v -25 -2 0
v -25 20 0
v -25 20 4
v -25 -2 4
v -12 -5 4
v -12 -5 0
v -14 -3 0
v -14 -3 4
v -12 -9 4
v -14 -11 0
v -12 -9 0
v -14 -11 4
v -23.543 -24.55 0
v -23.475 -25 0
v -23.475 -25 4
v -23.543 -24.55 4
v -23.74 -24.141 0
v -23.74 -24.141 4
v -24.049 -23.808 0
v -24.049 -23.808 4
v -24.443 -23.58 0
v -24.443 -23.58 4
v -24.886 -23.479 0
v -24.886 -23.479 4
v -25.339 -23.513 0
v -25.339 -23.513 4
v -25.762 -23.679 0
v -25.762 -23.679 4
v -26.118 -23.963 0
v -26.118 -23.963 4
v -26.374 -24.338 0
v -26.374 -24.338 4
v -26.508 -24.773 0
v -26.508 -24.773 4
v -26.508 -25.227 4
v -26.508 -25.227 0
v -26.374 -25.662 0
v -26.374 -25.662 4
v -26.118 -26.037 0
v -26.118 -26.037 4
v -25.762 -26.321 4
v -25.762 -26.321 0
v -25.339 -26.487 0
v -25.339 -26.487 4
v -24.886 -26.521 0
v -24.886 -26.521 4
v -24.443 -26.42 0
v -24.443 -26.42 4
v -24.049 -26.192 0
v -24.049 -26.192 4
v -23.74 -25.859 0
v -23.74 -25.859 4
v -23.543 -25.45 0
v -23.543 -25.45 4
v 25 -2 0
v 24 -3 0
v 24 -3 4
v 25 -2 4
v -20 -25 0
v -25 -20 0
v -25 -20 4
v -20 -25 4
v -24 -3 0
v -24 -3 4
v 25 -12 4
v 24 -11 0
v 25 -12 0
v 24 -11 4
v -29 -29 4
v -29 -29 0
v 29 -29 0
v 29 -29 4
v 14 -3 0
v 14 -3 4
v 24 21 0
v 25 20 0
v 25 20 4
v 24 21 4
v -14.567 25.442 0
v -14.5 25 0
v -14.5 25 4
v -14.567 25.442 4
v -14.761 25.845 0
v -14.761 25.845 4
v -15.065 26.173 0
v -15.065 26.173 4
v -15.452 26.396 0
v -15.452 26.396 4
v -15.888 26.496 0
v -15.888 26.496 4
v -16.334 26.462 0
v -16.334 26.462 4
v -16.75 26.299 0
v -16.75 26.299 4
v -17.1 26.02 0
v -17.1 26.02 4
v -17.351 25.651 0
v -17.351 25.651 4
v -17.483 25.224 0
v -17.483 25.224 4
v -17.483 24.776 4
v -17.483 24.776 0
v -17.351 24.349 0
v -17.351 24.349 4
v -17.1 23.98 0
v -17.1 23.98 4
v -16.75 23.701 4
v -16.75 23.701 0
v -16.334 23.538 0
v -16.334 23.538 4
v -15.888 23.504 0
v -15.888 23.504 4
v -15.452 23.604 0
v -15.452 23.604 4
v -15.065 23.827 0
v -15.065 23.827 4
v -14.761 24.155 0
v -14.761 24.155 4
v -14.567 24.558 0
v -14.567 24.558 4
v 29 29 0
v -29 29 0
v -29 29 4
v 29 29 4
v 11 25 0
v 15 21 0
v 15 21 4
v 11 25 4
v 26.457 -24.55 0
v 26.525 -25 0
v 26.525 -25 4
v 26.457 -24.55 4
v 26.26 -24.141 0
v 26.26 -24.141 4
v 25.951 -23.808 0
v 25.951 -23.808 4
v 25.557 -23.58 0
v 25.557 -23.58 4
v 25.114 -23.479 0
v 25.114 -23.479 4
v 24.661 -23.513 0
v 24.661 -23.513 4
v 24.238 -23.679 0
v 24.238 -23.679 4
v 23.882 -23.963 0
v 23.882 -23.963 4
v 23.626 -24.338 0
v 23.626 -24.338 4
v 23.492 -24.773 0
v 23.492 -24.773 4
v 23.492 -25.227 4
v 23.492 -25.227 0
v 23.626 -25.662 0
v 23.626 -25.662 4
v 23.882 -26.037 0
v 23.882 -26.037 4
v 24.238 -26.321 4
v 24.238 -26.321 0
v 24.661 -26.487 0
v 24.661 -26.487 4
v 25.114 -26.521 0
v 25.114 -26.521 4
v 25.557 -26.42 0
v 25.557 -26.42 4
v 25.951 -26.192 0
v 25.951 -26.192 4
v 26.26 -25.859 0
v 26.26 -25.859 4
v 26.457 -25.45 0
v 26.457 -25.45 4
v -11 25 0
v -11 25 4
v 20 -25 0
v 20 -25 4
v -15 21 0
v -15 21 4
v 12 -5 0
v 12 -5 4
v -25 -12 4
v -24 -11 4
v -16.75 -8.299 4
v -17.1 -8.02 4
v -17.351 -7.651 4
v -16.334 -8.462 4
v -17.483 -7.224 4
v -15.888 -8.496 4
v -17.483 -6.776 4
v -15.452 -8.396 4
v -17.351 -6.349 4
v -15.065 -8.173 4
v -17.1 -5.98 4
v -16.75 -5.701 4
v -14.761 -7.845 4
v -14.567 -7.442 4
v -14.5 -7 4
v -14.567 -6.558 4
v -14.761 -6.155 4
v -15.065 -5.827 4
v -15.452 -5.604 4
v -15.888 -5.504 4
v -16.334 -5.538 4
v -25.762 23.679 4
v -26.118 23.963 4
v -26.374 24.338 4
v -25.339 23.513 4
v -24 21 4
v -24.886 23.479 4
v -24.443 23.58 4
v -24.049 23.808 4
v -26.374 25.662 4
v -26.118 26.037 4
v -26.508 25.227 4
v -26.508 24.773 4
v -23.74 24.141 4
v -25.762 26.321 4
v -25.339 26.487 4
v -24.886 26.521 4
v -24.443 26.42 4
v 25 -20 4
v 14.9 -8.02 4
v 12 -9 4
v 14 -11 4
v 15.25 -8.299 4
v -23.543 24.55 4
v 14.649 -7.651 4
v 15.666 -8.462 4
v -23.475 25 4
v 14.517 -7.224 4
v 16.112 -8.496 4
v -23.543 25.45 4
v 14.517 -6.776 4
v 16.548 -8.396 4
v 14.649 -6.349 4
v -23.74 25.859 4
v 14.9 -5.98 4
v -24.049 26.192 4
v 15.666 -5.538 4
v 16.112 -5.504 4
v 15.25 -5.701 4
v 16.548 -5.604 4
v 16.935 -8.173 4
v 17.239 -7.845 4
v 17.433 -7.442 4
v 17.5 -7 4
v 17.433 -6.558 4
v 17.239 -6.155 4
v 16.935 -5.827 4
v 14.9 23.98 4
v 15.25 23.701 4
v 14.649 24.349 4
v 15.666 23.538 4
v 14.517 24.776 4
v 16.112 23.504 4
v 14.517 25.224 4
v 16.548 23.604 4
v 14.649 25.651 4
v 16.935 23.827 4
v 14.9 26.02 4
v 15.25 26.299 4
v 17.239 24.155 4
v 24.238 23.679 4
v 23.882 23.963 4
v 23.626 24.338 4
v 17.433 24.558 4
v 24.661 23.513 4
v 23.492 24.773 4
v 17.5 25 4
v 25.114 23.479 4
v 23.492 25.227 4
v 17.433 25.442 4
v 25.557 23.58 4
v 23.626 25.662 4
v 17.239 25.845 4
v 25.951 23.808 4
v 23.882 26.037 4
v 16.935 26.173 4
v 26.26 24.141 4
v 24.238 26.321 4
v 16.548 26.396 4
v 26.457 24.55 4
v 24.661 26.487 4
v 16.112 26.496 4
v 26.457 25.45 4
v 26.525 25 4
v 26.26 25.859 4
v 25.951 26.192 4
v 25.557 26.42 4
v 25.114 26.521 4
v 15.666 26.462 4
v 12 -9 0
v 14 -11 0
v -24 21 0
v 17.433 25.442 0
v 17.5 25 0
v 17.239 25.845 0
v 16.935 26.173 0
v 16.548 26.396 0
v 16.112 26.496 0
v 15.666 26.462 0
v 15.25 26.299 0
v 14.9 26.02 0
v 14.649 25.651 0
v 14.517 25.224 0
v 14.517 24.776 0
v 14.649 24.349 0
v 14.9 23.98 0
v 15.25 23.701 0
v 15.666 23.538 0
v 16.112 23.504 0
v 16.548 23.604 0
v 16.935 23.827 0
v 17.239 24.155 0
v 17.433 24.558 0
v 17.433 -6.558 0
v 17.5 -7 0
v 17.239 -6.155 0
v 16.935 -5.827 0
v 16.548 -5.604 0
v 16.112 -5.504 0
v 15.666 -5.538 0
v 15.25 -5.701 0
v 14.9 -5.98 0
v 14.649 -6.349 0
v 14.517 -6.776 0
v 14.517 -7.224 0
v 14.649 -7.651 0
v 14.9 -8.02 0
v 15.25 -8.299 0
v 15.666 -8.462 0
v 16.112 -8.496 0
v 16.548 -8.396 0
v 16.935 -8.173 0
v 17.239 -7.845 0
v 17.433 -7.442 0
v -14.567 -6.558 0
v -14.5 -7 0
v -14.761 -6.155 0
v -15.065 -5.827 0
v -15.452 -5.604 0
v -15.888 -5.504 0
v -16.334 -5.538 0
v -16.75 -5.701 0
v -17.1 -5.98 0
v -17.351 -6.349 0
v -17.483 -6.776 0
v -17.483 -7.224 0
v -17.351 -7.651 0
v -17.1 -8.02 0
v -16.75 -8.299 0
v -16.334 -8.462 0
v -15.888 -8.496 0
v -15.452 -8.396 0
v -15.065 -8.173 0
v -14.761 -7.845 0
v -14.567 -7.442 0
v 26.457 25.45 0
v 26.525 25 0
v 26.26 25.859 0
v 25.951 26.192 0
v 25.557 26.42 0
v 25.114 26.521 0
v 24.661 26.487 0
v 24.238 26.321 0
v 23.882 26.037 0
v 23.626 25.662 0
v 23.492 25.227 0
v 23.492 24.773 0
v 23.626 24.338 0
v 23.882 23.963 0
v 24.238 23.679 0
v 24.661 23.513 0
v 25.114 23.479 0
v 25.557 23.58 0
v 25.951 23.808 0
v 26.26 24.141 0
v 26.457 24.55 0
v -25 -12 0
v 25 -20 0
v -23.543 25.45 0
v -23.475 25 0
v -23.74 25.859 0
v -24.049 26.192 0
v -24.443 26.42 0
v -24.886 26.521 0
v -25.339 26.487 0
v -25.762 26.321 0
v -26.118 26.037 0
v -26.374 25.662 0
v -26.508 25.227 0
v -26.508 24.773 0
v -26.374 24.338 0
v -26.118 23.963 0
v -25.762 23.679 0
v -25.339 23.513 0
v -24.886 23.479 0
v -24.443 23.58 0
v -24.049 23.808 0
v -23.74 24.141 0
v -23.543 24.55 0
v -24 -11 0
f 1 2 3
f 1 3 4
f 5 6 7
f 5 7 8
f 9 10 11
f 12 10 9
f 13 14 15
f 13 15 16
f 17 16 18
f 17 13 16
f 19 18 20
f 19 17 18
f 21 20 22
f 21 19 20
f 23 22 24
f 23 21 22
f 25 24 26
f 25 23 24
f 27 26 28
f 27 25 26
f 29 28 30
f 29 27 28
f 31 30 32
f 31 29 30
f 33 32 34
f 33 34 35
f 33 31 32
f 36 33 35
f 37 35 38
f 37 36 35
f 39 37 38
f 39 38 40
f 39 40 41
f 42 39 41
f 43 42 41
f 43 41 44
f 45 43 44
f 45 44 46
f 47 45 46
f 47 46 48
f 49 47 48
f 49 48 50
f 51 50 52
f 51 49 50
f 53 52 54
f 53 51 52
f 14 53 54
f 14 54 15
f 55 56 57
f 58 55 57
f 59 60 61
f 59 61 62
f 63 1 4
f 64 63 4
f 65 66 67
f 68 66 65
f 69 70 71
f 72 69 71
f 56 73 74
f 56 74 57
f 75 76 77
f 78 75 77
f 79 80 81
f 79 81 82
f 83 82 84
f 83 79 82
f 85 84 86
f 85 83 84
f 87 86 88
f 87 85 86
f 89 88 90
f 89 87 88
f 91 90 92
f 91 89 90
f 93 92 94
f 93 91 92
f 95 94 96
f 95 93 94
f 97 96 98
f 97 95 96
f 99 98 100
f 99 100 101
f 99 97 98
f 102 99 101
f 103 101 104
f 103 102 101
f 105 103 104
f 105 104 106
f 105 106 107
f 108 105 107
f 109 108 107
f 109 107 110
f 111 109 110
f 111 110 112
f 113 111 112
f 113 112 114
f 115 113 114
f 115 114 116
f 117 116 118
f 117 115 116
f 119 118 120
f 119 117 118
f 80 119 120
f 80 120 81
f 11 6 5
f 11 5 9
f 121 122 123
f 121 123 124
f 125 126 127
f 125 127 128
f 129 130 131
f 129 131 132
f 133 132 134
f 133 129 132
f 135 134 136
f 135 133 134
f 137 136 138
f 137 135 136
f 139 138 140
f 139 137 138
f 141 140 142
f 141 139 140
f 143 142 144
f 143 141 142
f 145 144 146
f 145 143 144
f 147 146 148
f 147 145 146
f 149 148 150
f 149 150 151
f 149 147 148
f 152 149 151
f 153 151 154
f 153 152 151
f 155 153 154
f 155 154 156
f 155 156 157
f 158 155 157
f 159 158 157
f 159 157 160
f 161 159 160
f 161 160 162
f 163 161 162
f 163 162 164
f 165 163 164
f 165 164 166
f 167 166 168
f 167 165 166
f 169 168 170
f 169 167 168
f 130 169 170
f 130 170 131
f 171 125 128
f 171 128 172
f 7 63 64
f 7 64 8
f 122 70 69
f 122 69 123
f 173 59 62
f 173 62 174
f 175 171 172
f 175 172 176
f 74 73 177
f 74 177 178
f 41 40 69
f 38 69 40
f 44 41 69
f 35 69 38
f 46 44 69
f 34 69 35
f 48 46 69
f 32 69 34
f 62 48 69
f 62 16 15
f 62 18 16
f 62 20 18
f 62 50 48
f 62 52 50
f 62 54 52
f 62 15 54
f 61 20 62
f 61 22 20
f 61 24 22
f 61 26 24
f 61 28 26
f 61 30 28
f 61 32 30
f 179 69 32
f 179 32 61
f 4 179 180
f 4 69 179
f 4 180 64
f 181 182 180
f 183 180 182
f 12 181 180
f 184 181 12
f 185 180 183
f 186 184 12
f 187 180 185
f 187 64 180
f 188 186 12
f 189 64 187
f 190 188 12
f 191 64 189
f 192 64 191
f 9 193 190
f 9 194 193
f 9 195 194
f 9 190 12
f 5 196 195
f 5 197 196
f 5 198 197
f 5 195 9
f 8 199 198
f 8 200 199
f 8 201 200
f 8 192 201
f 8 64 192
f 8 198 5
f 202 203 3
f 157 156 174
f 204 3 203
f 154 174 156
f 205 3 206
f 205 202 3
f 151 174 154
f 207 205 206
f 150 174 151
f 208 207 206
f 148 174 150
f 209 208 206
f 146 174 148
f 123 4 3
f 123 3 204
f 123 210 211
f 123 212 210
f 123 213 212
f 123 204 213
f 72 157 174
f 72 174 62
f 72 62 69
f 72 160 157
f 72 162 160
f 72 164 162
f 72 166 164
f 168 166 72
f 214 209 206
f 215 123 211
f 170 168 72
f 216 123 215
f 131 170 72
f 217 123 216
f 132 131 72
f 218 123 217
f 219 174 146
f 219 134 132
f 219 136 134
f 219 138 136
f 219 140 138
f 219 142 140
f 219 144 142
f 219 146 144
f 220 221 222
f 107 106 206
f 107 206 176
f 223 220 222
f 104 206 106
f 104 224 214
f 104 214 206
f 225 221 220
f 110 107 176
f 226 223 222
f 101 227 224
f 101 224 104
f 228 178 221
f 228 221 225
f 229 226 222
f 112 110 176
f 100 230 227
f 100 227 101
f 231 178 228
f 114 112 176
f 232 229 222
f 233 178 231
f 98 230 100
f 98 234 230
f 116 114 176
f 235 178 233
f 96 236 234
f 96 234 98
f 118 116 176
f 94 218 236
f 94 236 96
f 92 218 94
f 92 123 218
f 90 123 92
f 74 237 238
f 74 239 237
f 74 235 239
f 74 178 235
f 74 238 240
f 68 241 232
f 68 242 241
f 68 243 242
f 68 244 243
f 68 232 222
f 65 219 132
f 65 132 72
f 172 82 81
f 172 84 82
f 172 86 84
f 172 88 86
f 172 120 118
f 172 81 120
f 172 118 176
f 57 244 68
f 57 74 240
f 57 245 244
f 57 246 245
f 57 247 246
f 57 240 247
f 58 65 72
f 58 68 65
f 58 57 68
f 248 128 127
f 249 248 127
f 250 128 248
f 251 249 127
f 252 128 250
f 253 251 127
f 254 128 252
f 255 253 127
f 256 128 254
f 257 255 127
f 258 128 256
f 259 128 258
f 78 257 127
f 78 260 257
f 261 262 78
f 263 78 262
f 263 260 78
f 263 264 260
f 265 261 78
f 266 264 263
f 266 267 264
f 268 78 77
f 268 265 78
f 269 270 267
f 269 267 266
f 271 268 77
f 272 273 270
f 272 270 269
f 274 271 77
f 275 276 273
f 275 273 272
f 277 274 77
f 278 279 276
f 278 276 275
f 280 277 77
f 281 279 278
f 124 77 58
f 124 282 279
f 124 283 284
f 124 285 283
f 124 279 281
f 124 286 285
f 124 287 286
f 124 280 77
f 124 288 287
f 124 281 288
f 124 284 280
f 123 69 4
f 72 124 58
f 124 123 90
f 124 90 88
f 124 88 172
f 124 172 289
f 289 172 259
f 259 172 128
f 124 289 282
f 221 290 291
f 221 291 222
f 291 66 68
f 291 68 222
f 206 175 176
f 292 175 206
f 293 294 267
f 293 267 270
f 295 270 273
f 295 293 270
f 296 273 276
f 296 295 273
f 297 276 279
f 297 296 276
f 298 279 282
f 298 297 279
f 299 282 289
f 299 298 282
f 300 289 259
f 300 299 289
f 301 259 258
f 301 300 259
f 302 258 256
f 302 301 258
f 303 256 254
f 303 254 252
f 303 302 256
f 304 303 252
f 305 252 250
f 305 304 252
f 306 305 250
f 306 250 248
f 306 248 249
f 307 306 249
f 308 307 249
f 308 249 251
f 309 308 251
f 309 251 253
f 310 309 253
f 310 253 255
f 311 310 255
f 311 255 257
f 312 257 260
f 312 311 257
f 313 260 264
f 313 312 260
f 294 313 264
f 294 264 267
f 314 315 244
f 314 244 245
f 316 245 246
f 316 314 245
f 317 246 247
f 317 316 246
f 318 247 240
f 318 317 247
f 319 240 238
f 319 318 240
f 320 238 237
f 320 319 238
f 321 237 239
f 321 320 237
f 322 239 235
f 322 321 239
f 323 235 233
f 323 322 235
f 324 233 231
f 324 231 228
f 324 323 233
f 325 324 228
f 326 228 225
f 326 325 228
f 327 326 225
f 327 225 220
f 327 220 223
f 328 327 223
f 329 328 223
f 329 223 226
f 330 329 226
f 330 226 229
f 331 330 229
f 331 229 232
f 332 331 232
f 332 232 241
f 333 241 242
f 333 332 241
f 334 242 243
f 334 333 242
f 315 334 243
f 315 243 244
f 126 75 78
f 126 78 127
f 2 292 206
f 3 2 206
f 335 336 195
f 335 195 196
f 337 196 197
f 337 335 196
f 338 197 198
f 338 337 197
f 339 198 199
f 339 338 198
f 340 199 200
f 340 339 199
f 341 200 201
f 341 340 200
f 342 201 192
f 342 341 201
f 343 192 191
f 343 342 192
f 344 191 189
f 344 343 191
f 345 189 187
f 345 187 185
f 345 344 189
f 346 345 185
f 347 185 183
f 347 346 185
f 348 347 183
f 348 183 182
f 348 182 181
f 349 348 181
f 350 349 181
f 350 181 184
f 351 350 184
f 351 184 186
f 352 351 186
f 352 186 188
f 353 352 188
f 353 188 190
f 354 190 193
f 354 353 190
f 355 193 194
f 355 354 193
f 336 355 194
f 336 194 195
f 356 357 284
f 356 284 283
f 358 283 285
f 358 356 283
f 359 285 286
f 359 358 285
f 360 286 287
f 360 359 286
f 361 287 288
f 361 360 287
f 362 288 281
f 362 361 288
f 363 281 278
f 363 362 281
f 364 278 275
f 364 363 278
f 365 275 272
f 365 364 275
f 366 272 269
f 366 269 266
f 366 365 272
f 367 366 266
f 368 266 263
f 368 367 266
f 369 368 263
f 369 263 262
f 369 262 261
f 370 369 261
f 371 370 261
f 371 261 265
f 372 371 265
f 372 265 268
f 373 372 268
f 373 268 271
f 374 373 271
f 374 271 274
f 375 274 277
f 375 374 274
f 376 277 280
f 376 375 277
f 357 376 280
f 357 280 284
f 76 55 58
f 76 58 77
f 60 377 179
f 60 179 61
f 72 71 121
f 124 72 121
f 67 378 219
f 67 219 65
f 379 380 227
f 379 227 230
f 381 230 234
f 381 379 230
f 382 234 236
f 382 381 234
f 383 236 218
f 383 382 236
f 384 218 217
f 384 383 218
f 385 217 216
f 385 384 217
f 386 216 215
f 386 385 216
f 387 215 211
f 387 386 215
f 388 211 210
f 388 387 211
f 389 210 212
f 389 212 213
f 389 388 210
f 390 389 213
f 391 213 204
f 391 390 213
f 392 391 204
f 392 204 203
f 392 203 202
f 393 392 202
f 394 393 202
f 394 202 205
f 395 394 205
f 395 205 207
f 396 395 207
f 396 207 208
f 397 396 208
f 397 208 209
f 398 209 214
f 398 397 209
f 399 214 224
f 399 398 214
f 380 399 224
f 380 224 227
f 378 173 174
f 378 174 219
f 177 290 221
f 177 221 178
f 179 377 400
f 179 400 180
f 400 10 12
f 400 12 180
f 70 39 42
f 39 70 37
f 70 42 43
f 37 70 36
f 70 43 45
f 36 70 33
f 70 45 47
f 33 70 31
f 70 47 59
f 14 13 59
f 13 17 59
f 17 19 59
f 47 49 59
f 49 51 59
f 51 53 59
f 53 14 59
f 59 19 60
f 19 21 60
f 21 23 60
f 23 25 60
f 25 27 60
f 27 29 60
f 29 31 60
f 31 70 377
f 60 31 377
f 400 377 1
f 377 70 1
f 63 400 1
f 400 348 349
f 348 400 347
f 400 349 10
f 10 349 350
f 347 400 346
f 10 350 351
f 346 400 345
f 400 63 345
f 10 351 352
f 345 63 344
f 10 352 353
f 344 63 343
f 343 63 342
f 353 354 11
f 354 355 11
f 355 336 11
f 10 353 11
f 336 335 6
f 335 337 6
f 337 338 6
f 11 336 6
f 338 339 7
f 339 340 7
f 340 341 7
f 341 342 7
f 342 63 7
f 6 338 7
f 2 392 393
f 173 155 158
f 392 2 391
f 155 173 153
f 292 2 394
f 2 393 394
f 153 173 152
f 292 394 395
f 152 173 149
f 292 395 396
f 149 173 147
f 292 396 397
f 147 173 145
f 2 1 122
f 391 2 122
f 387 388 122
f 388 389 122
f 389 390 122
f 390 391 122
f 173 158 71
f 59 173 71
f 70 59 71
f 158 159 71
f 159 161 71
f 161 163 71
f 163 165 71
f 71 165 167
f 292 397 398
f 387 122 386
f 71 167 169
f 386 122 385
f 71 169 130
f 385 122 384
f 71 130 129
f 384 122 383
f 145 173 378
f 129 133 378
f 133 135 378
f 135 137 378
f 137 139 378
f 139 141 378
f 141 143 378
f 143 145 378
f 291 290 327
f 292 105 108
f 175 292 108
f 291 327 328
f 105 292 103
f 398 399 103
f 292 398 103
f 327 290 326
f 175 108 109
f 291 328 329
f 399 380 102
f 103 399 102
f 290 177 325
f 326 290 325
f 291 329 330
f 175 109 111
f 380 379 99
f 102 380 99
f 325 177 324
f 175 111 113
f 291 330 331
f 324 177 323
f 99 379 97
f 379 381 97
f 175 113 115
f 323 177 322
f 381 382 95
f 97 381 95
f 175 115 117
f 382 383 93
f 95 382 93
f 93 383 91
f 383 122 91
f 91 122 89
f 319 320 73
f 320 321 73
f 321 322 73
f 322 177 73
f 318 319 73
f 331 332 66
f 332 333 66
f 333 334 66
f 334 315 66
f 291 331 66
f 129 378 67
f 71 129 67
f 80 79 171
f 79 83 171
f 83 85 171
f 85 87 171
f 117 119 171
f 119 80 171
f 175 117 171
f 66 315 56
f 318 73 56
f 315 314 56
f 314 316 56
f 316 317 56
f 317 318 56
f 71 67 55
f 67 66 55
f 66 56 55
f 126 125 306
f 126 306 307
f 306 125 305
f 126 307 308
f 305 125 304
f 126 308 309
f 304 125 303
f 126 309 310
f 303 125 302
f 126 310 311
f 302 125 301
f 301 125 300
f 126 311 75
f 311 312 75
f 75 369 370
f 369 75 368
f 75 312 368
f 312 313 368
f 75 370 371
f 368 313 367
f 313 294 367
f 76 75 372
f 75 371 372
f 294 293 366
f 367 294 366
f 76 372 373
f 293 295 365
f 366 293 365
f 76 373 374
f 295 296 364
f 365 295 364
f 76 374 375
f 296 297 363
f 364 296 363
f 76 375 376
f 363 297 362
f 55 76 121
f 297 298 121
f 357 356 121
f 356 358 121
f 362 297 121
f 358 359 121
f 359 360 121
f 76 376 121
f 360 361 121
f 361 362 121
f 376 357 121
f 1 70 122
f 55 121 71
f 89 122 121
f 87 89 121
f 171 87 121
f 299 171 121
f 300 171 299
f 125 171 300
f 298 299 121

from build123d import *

# Parameters (mm, degrees)
SKETCH009_W     = 58
SKETCH009_H     = 58
SKETCH009_R     = 1.525
SKETCH009_R_2   = 1.5
PAD005_DEPTH    = 4
CHAMFER_SIZE    = 2
CHAMFER001_SIZE = 1


with BuildPart() as part:
    # Sketch009 → Pad005 (new body)
    with BuildSketch(Plane.XY):
        Rectangle(SKETCH009_W, SKETCH009_H)
        with Locations((-25, 25)):
            Circle(SKETCH009_R, mode=Mode.SUBTRACT)
        with Locations((25, 25)):
            Circle(SKETCH009_R, mode=Mode.SUBTRACT)
        with Locations((25, -25)):
            Circle(SKETCH009_R, mode=Mode.SUBTRACT)
        with Locations((-25, -25)):
            Circle(SKETCH009_R, mode=Mode.SUBTRACT)
        with Locations((-16, 25)):
            Circle(SKETCH009_R_2, mode=Mode.SUBTRACT)
        with Locations((16, 25)):
            Circle(SKETCH009_R_2, mode=Mode.SUBTRACT)
        with Locations((-16, -7)):
            Circle(SKETCH009_R_2, mode=Mode.SUBTRACT)
        with Locations((16, -7)):
            Circle(SKETCH009_R_2, mode=Mode.SUBTRACT)
        Polygon((-25, -3), (-12, -3), (-12, -11), (-25, -11), (-25, -20), (-20, -25), (20, -25), (25, -20), (25, -11), (12, -11), (12, -3), (25, -3), (25, 21), (15, 21), (11, 25), (-11, 25), (-15, 21), (-25, 21), align=None, mode=Mode.SUBTRACT)
    extrude(amount=PAD005_DEPTH)

    # Chamfer
    chamfer_edges = [part.edges().sort_by_distance(p)[0] for p in [
        (-12, -3, 2),
        (-12, -11, 2),
        (12, -11, 2),
        (12, -3, 2),
    ]]
    chamfer(chamfer_edges, length=CHAMFER_SIZE)

    # Chamfer001
    chamfer001_edges = [part.edges().sort_by_distance(p)[0] for p in [
        (-25, -3, 2),
        (-25, 21, 2),
        (25, 21, 2),
        (25, -3, 2),
        (-25, -11, 2),
        (25, -11, 2),
    ]]
    chamfer(chamfer001_edges, length=CHAMFER001_SIZE)


solid = part.part
